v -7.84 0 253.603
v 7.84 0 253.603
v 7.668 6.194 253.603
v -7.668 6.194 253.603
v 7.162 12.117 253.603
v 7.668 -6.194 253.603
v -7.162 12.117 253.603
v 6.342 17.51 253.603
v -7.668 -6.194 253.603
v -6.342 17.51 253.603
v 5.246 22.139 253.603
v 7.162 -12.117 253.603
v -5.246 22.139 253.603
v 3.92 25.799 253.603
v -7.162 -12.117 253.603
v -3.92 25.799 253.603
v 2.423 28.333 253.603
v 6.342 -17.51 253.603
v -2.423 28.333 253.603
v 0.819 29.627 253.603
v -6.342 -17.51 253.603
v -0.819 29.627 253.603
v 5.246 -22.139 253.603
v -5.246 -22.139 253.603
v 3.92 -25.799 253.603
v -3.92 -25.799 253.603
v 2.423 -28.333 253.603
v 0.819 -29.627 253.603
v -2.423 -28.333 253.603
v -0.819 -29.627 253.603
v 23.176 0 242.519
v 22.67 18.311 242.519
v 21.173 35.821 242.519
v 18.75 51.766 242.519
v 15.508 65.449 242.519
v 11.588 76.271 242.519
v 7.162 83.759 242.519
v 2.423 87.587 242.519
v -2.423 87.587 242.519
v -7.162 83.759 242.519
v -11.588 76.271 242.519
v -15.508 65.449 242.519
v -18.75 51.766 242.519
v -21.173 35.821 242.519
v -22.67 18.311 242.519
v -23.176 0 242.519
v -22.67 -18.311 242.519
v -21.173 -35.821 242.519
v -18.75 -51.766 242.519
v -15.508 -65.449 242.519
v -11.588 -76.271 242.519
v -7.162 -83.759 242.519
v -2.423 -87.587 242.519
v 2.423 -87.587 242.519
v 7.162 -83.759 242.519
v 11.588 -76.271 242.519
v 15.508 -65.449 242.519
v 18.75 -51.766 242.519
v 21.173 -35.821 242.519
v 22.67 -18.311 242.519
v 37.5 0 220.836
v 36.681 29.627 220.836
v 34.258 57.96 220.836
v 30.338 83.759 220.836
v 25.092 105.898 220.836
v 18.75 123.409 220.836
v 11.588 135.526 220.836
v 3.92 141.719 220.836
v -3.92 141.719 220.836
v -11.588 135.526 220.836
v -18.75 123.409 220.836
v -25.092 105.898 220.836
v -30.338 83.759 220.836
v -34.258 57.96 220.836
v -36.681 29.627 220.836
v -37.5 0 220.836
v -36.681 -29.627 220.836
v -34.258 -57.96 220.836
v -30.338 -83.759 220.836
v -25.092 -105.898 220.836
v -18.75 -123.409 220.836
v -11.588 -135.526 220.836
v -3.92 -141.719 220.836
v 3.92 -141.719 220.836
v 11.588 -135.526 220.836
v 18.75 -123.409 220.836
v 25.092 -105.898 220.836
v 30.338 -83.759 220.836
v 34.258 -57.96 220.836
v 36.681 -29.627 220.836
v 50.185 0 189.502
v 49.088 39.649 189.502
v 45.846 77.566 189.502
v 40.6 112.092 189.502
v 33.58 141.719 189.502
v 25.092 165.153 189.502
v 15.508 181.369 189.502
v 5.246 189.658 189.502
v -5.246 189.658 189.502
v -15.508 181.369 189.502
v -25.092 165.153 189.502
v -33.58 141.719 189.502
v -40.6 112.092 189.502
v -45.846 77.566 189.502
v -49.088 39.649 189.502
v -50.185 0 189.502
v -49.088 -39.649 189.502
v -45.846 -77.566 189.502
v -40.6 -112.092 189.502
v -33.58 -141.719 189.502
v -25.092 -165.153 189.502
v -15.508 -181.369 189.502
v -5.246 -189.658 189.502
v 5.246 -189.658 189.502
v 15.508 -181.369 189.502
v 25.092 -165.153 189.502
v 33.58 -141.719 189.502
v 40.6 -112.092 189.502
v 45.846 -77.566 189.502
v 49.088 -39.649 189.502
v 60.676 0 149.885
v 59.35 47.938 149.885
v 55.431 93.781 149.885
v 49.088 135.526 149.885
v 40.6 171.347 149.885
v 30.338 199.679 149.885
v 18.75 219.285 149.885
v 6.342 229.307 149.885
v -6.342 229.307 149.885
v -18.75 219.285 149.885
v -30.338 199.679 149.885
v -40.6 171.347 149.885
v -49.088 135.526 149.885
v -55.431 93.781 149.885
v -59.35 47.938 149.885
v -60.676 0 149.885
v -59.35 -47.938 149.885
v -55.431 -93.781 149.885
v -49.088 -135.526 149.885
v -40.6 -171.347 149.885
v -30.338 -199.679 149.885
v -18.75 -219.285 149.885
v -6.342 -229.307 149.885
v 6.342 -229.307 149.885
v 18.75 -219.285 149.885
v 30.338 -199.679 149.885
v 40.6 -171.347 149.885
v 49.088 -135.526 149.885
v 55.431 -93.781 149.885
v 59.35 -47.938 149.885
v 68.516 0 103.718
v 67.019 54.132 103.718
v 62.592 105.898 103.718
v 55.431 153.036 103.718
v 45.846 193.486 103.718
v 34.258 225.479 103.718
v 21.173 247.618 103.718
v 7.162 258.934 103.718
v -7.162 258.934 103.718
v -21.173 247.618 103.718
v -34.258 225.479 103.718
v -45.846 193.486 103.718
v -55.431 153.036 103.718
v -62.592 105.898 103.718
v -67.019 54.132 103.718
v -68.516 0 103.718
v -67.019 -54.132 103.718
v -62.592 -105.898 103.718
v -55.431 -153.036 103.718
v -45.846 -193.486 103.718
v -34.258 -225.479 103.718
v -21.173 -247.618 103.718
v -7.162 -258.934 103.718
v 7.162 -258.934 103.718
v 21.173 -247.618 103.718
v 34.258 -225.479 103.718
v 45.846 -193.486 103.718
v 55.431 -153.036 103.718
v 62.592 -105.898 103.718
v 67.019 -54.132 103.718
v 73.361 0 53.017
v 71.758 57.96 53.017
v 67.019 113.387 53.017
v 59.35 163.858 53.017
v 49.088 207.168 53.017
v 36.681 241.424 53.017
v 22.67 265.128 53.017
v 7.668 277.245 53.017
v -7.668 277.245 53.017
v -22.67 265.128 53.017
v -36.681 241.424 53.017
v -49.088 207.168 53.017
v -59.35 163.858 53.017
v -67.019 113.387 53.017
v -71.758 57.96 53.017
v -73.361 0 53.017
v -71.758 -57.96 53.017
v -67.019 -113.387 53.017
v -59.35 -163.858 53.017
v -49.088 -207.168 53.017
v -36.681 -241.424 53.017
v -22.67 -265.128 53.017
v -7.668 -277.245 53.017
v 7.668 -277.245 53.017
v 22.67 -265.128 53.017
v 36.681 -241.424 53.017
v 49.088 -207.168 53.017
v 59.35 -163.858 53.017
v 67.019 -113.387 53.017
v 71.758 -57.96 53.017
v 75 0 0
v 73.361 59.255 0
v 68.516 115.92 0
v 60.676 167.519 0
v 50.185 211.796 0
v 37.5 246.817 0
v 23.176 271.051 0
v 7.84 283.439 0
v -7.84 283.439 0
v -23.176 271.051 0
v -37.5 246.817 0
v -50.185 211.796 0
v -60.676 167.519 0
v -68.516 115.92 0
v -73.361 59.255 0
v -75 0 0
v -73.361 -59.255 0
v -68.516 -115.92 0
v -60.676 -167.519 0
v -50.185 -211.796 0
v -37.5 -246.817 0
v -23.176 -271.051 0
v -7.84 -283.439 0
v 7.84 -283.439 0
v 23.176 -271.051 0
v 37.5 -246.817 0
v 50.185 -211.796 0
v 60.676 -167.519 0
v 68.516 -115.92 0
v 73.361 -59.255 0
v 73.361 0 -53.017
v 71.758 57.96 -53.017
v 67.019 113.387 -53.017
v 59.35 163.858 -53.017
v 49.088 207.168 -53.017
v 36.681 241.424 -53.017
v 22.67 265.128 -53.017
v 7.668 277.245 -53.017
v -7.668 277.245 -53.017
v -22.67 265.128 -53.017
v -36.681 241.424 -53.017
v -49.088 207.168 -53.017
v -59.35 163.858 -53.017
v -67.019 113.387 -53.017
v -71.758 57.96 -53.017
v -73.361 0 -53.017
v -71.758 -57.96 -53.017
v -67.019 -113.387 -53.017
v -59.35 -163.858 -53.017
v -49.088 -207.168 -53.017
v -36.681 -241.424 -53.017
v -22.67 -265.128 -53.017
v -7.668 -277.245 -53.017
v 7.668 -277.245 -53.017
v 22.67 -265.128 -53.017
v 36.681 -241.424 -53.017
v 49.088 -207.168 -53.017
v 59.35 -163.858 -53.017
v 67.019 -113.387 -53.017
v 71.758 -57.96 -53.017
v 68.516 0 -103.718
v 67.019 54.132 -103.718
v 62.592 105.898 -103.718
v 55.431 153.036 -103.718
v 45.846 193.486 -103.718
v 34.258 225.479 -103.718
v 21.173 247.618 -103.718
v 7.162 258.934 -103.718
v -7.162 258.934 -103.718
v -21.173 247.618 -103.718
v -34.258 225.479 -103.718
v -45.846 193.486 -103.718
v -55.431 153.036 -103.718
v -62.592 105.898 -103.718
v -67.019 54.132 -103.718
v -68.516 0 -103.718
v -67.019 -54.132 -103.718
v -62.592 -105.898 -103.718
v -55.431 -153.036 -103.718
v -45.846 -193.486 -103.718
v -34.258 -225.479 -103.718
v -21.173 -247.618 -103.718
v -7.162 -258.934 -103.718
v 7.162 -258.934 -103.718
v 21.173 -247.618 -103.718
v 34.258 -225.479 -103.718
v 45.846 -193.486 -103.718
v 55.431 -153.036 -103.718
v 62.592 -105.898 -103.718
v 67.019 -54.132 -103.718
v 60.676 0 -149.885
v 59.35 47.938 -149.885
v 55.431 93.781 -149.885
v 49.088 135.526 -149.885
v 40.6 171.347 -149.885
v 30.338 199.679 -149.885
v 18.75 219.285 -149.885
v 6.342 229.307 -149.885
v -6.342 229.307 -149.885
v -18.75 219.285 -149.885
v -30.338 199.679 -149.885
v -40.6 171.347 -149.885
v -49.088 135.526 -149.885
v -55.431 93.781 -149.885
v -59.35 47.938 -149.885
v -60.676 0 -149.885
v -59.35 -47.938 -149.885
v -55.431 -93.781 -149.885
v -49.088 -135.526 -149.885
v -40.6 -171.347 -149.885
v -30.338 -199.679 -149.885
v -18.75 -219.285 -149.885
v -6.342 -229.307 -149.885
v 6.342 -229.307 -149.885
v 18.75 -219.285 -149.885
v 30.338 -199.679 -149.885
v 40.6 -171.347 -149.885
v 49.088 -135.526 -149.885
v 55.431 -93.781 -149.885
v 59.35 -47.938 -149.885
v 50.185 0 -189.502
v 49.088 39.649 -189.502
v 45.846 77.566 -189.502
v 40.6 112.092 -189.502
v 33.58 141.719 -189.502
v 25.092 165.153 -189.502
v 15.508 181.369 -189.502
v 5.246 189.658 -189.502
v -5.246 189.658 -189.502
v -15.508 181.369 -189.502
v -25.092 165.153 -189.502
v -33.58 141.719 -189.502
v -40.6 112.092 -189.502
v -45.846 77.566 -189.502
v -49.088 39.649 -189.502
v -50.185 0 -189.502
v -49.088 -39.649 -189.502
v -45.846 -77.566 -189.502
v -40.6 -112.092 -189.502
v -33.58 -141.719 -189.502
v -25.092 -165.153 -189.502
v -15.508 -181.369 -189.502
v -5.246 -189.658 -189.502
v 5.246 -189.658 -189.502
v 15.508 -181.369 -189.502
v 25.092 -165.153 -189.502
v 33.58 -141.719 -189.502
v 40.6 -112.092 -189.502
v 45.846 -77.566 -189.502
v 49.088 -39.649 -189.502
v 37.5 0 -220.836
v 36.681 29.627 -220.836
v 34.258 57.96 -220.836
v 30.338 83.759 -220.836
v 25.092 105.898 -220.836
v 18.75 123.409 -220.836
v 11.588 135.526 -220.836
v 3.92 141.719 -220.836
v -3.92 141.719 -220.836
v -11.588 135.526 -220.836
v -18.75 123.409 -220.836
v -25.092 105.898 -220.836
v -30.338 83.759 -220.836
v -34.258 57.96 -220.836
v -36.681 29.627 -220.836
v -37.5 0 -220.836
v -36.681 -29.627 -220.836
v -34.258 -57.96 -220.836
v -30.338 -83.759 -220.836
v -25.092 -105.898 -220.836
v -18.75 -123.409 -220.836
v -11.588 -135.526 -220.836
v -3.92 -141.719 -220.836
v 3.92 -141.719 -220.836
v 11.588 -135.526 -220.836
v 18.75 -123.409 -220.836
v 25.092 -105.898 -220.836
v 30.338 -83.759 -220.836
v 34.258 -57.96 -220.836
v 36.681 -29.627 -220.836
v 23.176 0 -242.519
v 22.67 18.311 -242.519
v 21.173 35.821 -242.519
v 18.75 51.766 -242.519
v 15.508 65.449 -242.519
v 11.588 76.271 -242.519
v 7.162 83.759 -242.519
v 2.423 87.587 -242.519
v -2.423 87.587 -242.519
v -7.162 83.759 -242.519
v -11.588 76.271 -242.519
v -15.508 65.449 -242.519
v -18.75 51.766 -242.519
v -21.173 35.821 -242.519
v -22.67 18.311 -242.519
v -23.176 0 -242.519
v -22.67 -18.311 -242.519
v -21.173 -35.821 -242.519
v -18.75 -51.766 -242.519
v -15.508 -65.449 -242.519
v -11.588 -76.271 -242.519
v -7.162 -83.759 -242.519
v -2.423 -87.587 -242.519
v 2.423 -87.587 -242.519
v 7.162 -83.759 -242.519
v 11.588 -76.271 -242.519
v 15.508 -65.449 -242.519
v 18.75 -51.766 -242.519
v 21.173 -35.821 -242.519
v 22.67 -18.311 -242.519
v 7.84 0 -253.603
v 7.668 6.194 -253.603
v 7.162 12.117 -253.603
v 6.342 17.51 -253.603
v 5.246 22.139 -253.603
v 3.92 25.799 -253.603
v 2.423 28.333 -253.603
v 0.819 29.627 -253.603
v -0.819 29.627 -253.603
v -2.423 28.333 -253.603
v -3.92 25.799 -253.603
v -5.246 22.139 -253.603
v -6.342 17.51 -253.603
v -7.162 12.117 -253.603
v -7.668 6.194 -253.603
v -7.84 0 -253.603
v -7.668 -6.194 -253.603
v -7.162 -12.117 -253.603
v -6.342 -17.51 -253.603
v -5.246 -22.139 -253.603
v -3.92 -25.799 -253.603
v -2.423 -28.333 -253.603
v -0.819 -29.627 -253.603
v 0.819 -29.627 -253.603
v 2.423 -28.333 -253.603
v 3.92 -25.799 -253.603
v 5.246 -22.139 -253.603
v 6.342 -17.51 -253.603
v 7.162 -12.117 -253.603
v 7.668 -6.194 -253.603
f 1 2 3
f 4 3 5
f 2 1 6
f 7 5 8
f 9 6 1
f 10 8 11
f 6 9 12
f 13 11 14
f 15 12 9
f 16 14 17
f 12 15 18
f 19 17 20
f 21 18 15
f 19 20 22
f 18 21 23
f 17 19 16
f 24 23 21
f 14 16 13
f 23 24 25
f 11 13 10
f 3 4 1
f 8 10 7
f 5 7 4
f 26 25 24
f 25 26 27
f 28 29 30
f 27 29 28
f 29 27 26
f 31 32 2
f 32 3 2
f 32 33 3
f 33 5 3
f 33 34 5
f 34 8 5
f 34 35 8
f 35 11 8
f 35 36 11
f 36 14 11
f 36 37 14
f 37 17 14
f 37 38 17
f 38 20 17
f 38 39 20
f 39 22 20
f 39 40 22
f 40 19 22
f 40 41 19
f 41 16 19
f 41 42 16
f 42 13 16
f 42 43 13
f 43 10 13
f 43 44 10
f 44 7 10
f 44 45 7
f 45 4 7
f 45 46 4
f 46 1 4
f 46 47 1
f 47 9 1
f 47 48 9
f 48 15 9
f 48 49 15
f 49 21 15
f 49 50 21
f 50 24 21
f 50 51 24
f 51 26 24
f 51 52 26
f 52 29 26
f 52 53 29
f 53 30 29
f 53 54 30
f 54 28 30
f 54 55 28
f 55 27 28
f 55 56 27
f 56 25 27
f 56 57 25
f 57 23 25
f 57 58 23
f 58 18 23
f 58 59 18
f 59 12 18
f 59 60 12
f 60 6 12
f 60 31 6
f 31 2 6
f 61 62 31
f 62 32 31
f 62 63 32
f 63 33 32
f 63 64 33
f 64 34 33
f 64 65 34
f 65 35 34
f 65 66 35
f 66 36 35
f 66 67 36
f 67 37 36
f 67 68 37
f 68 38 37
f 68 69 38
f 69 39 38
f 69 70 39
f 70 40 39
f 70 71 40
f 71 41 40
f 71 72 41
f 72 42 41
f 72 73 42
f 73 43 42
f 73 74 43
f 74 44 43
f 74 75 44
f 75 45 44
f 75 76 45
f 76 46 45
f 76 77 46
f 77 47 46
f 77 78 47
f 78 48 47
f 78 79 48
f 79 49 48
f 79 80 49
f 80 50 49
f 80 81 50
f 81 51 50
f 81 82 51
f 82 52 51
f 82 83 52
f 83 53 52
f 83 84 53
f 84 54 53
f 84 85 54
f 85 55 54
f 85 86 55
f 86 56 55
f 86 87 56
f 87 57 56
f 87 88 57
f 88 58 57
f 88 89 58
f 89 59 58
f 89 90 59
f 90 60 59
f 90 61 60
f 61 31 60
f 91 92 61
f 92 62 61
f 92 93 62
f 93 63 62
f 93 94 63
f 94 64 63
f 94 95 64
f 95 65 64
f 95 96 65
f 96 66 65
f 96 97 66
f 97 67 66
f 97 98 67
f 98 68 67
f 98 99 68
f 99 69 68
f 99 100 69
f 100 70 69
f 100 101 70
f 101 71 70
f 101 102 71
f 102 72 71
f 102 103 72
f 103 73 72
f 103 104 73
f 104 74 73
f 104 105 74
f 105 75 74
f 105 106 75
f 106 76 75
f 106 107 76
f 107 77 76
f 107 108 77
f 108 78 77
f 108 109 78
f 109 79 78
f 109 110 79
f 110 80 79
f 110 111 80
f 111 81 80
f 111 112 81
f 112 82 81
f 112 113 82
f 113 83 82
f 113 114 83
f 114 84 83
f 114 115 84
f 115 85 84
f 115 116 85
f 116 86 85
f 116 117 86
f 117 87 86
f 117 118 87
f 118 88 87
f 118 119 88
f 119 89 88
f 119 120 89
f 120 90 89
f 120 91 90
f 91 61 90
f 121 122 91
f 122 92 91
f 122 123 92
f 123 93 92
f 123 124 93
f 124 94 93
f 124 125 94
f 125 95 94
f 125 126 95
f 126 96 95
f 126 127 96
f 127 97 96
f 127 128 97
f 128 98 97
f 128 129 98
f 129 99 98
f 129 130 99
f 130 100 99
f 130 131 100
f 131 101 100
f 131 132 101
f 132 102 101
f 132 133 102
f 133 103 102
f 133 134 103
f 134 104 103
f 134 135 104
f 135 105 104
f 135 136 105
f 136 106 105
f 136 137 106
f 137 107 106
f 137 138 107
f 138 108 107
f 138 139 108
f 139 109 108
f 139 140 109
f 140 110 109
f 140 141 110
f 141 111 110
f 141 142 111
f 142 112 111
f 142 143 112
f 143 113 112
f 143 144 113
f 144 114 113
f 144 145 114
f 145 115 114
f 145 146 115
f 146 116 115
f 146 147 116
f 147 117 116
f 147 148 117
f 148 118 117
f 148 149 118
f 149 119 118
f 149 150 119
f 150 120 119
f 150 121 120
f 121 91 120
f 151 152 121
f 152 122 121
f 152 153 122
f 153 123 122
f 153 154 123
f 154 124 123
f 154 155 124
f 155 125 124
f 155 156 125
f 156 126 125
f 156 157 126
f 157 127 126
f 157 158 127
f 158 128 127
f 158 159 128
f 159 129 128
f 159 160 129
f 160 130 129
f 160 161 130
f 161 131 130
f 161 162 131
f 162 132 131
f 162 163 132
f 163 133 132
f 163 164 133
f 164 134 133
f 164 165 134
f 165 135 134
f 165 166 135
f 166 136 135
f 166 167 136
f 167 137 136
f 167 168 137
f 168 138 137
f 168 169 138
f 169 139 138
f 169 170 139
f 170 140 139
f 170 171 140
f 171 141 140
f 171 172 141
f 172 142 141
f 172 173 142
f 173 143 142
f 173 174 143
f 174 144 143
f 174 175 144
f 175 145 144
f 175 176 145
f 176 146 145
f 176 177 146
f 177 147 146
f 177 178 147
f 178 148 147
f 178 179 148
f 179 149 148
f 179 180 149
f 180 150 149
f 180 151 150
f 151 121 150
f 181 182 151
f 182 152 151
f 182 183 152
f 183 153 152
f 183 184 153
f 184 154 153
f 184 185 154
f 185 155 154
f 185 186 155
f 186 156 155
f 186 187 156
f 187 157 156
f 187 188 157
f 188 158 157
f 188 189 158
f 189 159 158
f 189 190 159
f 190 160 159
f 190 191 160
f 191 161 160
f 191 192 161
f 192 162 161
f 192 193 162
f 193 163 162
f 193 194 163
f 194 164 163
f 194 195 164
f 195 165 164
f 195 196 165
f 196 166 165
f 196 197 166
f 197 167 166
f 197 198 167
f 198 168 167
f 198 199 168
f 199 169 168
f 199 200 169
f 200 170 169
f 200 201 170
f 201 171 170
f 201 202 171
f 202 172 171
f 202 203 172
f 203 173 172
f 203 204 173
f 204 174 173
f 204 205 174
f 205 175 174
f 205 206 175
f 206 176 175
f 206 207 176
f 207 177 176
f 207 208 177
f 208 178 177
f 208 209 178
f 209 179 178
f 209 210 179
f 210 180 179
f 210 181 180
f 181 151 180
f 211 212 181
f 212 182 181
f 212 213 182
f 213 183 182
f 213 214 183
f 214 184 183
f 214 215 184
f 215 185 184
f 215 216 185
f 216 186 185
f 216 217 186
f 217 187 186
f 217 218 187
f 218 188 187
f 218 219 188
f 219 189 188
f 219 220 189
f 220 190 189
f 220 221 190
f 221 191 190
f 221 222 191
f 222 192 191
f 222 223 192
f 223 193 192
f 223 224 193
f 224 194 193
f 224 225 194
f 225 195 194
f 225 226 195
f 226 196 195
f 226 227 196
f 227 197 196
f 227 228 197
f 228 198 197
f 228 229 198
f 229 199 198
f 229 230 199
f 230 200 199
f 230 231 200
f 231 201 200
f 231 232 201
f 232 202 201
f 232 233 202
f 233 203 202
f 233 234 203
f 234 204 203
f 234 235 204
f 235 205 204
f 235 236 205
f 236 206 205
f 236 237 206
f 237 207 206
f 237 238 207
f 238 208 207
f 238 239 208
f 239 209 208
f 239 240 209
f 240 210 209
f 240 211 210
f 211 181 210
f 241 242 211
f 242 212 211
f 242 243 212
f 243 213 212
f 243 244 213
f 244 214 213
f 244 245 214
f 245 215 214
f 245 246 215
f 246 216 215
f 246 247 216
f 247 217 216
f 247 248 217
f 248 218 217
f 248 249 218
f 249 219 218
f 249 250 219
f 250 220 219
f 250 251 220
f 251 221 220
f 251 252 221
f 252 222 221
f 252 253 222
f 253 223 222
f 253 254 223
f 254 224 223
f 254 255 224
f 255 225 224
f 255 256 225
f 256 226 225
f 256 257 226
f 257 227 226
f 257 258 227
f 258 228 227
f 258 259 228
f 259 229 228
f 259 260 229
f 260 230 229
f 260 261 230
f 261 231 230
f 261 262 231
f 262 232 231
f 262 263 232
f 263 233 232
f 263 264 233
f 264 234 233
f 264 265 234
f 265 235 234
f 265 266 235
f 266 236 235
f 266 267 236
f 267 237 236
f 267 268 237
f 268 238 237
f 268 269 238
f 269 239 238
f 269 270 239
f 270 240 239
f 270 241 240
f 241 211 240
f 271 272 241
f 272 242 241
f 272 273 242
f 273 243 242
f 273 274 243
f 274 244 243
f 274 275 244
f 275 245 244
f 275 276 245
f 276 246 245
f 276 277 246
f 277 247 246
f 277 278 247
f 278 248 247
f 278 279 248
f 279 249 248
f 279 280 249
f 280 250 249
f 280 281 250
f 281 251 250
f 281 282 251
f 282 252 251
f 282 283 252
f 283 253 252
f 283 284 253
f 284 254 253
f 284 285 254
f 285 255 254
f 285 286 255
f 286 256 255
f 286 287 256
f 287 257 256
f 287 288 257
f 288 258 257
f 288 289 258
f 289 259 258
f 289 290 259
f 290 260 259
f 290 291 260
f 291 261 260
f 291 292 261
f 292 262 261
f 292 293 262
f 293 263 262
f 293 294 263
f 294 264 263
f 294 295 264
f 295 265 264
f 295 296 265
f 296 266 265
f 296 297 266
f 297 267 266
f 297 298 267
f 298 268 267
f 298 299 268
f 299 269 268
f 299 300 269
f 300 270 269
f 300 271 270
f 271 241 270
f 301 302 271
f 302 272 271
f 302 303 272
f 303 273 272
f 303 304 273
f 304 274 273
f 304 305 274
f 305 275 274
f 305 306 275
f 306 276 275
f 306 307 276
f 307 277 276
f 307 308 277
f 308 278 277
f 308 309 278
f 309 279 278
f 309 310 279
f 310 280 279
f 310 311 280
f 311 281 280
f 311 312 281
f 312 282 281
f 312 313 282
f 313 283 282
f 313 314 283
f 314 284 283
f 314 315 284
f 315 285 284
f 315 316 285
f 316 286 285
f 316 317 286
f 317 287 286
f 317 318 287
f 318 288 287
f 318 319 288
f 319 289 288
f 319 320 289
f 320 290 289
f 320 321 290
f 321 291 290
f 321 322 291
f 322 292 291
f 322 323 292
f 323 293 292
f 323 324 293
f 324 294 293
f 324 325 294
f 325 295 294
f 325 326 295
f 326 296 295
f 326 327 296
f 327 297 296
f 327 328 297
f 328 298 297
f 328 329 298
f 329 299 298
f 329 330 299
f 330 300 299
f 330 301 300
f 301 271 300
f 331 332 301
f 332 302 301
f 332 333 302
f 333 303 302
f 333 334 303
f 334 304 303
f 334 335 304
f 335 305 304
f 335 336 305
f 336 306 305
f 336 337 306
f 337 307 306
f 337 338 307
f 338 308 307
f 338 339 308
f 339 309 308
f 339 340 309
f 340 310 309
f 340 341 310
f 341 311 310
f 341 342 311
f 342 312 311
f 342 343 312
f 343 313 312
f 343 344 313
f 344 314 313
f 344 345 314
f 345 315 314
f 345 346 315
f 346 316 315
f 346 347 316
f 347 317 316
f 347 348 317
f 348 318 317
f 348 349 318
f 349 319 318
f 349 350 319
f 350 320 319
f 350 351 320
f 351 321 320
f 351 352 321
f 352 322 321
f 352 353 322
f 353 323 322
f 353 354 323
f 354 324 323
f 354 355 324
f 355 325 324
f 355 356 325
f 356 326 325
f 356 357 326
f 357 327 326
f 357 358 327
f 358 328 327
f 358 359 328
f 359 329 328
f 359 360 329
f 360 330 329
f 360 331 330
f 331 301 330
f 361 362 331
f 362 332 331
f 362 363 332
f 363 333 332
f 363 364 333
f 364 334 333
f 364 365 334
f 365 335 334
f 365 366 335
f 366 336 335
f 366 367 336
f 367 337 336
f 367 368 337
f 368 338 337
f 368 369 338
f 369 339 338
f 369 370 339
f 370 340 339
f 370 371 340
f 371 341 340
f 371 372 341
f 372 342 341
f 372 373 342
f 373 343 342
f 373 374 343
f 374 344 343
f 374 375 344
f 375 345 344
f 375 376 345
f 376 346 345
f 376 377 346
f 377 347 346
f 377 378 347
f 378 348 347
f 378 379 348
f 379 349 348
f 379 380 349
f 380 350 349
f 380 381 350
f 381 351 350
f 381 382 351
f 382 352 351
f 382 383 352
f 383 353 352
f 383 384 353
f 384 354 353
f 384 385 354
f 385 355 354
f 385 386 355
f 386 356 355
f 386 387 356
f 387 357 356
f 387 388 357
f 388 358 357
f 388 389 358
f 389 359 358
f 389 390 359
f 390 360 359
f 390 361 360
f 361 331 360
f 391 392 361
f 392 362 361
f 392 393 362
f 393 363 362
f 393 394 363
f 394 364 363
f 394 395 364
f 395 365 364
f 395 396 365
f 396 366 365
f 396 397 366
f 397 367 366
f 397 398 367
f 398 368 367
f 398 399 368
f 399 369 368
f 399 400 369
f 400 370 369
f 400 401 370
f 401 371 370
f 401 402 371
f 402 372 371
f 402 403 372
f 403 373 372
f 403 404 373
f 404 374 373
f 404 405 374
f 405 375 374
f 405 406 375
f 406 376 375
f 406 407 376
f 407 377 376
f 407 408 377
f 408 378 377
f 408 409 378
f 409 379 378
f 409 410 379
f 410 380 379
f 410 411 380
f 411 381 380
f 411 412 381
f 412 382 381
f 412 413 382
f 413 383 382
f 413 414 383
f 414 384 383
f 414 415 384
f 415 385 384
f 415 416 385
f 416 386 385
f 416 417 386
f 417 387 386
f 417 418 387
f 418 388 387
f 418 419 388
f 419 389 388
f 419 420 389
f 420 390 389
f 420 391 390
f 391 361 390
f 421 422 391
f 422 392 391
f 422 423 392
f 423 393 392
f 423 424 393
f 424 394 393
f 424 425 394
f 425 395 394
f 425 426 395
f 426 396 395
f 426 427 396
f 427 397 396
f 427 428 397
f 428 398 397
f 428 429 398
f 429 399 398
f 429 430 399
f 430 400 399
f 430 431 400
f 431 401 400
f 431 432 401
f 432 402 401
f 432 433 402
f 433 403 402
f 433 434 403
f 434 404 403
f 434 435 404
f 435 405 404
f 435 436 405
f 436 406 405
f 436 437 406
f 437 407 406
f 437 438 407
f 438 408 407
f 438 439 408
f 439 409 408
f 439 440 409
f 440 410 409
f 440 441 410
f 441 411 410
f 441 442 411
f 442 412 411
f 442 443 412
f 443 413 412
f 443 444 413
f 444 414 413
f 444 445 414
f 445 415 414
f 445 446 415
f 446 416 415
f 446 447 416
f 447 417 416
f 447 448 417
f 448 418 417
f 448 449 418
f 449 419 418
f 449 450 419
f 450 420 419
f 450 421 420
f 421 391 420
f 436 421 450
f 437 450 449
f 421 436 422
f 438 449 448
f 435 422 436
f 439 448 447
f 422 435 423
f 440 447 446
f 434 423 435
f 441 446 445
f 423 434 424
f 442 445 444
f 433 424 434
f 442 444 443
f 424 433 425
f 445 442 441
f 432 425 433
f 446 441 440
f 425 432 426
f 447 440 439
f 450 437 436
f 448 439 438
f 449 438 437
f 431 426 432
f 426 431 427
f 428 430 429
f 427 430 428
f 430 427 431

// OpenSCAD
// Generated by SolidPython 1.0.1 on 2020-07-29 00:46:47


scale(v = [5, 19, 17]) {
	sphere(r = 15);
}
/***********************************************
*********      SolidPython code:      **********
************************************************
 
# import packages: SolidPython
from solid import *
from solid.utils import *
from itertools import chain, combinations, permutations


class Resize:

    def __init__(self, scad_file):
        self.scad_file = scad_file
        #self.scad_file = import_scad(scad_file)
        # cone/cylinder param:
        self.r1 = 0
        self.r2 = 0
        self.h = 0
        # rectangular prism param:
        self.w = 0
        self.l = 0
        # ellipse param:
        self.r = 0

    # import OpenScad code (file name corresponds to shape)


    # classify shape + parameters
    def assign(self, param1, param2, param3):
        if self.scad_file == 'cone.scad':
            self.r1 = param1
            self.r2 = param2
            self.h = param3
        elif self.scad_file == 'cylinder.scad':
            self.r1 = param1
            self.r2 = param2
            self.h = param3
        elif self.scad_file == 'rectangularPrism.scad':
            self.h = param1
            self.l = param2
            self.w = param3
        else:
            self.r = param1
            self.h = param2

    # resize parameters
    def iterate(self):
        x = range(3, 20, 2)
        i = 1
        if self.scad_file == 'cone.scad':
            tempList = list(permutations(x, 2))
            for temp in tempList:
                param1 = temp[0]
                param2 = temp[1]
                filepath = 'produced_scad_files/' + 'cone' + str(param1) + '_' + str(param2) + '_' + '.scad'
                scad_render_to_file(cylinder(h=param1, r1=param2, r2=0), filepath)

        elif self.scad_file == 'cylinder.scad':
            tempList = list(permutations(x, 3))
            for temp in tempList:
                param1 = temp[0]
                param2 = temp[1]
                filepath = 'produced_scad_files/' + 'cylinder' + str(param1) + '_' + str(param2) + '_' + '.scad'
                scad_render_to_file(cylinder(h=param1, r1=param2, r2=param2), filepath)

        elif self.scad_file == 'rectangularPrism.scad':
            tempList = list(permutations(x, 3))
            for temp in tempList:
                param1 = temp[0]
                param2 = temp[1]
                param3 = temp[2]
                filepath = 'produced_scad_files/' + 'rectangularPrism' + str(param1) + '_' + str(param2) + '_' + str(
                    param3) + '.scad'
                scad_render_to_file(cube(size=(param1, param2, param3)), filepath)

        elif self.scad_file == 'ellipse.scad':
            tempList = list(permutations(x, 4))
            for temp in tempList:
                param1 = temp[0]
                param2 = temp[1]
                param3 = temp[2]
                param4 = temp[3]
                filepath = 'produced_scad_files/' + 'ellipse' + str(param1) + '_' + str(param2) + '_' + str(param3) + '_' + str(param4) + '.scad'
                scad_render_to_file(scale([param1, param2, param3])(sphere(r=param4)), filepath)

    def render_to_scadfile(self):
        scad_render_to_file(scad, 'example.scad') 
 
************************************************/
